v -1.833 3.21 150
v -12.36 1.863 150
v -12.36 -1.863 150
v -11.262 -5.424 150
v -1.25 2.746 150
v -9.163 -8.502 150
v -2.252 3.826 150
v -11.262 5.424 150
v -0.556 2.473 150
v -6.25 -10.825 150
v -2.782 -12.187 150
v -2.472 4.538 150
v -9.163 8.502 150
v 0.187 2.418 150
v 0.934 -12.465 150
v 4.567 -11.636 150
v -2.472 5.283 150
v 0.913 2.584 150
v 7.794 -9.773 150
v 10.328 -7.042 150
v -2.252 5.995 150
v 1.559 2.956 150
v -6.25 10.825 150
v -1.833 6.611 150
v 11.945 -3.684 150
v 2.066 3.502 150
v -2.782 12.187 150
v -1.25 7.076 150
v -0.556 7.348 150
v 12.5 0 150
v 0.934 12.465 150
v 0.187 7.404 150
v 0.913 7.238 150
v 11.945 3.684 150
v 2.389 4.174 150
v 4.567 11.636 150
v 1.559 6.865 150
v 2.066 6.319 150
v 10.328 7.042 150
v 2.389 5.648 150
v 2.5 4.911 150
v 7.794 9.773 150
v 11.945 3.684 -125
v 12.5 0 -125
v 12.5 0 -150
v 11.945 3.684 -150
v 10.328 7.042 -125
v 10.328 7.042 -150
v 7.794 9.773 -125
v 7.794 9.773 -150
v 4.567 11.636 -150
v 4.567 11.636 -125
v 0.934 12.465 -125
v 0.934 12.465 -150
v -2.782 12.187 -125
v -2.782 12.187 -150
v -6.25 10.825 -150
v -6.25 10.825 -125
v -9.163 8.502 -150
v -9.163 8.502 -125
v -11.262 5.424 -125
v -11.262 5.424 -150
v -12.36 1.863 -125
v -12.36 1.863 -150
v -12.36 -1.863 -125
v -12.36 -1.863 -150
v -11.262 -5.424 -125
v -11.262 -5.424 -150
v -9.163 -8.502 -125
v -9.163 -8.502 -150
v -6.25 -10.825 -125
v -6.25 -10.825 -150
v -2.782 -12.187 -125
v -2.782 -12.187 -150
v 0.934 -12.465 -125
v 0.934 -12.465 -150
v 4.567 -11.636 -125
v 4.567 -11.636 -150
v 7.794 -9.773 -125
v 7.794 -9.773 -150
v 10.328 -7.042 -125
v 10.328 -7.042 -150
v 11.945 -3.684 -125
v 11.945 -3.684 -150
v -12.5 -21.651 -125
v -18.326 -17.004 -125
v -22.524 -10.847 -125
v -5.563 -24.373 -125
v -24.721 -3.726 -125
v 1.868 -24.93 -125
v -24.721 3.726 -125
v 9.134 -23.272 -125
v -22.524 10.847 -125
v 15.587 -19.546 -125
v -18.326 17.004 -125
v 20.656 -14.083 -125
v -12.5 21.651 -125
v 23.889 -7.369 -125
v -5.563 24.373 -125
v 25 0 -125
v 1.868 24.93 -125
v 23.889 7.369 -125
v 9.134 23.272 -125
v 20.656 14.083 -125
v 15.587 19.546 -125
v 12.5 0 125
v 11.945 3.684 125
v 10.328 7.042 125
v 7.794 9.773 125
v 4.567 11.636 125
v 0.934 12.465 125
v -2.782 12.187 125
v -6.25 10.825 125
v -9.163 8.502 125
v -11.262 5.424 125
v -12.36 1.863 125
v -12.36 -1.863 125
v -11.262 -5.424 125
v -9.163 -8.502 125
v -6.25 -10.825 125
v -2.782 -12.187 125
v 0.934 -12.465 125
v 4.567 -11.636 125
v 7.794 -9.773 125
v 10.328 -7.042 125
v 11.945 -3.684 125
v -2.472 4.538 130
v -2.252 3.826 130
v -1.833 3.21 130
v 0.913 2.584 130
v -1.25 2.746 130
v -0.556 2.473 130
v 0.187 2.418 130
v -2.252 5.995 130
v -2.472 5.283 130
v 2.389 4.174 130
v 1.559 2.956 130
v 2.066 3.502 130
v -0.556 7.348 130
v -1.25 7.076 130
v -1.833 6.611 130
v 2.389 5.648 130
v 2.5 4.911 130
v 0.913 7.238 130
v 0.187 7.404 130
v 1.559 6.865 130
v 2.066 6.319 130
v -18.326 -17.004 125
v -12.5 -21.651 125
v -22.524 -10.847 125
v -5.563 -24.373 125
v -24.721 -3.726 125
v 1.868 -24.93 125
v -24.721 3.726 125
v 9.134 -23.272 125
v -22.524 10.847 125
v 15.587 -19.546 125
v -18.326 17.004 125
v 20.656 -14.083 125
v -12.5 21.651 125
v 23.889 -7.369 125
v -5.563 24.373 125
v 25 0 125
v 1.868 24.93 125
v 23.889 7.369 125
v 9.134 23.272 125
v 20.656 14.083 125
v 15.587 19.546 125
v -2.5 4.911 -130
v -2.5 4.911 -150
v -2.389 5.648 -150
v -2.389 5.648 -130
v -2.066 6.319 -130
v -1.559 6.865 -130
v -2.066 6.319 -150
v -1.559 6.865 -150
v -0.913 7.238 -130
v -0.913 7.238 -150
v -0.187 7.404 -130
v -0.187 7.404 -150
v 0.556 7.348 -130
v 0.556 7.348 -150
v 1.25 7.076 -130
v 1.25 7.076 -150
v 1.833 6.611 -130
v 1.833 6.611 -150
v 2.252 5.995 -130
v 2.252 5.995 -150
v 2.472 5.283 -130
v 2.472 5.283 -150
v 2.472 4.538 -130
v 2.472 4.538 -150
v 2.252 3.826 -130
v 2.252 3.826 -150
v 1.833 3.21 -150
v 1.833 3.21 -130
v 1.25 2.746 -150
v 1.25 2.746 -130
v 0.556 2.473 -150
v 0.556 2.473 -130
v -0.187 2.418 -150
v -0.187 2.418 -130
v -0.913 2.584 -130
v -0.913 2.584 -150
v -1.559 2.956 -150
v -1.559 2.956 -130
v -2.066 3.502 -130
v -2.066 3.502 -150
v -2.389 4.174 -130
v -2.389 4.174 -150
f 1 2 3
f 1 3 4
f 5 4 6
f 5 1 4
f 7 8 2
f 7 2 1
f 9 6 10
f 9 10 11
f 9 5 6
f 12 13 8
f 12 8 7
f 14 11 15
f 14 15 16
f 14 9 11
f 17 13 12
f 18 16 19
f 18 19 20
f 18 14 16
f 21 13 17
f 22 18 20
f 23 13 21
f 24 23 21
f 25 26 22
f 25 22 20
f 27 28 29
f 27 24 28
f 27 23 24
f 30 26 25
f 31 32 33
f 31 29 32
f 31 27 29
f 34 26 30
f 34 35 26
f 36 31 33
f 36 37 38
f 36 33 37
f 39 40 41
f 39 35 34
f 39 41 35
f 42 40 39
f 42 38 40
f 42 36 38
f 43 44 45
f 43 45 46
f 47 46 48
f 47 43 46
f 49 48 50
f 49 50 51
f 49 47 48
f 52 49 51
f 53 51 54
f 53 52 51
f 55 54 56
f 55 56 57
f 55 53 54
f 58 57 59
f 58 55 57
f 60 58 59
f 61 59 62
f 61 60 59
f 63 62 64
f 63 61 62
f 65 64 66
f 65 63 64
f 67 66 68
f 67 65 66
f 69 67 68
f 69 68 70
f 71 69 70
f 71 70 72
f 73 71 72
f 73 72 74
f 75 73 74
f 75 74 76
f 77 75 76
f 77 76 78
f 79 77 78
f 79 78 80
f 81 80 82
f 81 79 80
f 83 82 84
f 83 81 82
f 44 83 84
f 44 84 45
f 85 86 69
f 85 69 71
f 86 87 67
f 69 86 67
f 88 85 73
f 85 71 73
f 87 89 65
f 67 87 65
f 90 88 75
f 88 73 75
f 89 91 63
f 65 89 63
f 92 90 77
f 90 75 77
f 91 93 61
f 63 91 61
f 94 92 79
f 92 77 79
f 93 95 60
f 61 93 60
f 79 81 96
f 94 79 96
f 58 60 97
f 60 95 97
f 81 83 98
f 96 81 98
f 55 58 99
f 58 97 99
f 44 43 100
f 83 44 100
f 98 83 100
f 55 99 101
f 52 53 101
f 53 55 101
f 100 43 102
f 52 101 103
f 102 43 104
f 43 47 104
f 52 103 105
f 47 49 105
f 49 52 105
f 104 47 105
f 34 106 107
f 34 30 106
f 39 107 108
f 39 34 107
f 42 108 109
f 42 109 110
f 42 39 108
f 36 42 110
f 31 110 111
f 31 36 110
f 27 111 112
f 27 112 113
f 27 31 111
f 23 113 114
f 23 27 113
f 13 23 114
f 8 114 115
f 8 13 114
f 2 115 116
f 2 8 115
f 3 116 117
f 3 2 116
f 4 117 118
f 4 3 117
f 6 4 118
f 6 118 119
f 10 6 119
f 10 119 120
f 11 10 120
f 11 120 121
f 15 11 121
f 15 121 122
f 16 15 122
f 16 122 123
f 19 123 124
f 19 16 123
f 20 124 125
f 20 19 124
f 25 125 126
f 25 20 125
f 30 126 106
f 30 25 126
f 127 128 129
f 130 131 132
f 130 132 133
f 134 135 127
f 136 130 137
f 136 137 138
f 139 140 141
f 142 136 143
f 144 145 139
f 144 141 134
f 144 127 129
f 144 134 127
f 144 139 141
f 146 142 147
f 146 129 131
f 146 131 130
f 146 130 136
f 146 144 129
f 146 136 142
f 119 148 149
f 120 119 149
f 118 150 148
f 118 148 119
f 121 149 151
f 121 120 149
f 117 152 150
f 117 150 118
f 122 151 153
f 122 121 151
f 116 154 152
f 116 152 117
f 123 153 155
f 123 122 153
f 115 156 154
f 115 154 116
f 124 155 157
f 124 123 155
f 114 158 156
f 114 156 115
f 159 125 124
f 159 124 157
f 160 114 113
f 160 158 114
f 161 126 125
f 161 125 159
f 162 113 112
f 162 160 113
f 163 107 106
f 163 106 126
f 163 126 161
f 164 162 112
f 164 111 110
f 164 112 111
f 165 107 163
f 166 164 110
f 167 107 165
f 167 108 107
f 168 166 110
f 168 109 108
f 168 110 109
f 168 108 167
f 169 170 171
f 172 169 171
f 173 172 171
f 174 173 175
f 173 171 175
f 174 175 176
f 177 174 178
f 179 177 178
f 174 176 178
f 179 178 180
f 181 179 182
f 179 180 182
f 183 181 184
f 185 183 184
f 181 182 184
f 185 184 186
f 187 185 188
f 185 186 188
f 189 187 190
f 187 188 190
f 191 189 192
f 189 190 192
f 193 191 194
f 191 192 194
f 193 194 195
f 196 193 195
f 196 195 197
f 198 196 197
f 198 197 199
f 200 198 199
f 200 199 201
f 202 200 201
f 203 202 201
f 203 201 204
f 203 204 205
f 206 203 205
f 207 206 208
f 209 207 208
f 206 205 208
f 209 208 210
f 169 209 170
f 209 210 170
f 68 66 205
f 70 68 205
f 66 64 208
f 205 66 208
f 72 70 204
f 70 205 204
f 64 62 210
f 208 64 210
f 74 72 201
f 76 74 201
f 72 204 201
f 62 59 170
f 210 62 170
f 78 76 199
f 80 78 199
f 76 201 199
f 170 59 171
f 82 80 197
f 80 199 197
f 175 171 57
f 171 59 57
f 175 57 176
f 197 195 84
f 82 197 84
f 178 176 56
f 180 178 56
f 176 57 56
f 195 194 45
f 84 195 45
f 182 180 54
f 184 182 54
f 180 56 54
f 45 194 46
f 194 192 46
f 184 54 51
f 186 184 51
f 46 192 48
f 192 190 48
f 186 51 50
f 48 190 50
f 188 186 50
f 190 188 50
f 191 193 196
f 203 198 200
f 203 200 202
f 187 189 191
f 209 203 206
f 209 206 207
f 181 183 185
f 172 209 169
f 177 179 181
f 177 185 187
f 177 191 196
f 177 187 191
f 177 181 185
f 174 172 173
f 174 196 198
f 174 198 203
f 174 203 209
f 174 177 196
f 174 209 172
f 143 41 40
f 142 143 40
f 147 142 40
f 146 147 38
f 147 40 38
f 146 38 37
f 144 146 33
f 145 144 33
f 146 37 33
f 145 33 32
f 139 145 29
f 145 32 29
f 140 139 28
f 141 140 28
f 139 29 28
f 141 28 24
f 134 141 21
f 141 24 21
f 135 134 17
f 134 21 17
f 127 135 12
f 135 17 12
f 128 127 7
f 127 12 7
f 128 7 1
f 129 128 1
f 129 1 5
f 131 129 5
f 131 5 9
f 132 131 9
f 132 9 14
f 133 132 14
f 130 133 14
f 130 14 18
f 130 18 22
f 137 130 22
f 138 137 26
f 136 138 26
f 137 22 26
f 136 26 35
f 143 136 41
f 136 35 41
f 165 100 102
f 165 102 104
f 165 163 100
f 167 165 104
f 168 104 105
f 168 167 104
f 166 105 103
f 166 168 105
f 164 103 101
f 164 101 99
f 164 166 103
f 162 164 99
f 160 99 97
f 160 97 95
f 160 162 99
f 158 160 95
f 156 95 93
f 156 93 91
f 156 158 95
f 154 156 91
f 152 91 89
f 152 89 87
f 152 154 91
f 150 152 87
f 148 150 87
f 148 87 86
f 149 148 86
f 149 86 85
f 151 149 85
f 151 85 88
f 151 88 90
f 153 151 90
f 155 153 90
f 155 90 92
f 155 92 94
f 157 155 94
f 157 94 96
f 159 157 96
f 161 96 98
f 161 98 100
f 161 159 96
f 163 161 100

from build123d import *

# Parameters (mm, degrees)
SKETCH9_R           = 25
BOSS_EXTRUDE1_DEPTH = 125
SKETCH10_R          = 12.5
BOSS_EXTRUDE4_DEPTH = 150
SKETCH20_R          = 2.5
CUT_EXTRUDE5_DEPTH  = 20
SKETCH19_R          = 2.5
CUT_EXTRUDE6_DEPTH  = 20


with BuildPart() as part:
    # Sketch9 → Boss-Extrude1 (new body, symmetric)
    with BuildSketch(Plane.XY):
        Circle(SKETCH9_R)
    extrude(amount=BOSS_EXTRUDE1_DEPTH, both=True)

    # Sketch10 → Boss-Extrude4 (add, symmetric)
    with BuildSketch(Plane.XY):
        Circle(SKETCH10_R)
    extrude(amount=BOSS_EXTRUDE4_DEPTH, both=True)

    # Sketch20 → Cut-Extrude5 (cut)
    with BuildSketch(Plane(origin=(0, 0, -150), x_dir=(-1, 0, 0), z_dir=(0, 0, -1))):
        with Locations((0, 4.91077603)):
            Circle(SKETCH20_R)
    extrude(amount=-CUT_EXTRUDE5_DEPTH, mode=Mode.SUBTRACT)

    # Sketch19 → Cut-Extrude6 (cut)
    with BuildSketch(Plane.XY.offset(150)):
        with Locations((0, 4.91077603)):
            Circle(SKETCH19_R)
    extrude(amount=-CUT_EXTRUDE6_DEPTH, mode=Mode.SUBTRACT)


solid = part.part
